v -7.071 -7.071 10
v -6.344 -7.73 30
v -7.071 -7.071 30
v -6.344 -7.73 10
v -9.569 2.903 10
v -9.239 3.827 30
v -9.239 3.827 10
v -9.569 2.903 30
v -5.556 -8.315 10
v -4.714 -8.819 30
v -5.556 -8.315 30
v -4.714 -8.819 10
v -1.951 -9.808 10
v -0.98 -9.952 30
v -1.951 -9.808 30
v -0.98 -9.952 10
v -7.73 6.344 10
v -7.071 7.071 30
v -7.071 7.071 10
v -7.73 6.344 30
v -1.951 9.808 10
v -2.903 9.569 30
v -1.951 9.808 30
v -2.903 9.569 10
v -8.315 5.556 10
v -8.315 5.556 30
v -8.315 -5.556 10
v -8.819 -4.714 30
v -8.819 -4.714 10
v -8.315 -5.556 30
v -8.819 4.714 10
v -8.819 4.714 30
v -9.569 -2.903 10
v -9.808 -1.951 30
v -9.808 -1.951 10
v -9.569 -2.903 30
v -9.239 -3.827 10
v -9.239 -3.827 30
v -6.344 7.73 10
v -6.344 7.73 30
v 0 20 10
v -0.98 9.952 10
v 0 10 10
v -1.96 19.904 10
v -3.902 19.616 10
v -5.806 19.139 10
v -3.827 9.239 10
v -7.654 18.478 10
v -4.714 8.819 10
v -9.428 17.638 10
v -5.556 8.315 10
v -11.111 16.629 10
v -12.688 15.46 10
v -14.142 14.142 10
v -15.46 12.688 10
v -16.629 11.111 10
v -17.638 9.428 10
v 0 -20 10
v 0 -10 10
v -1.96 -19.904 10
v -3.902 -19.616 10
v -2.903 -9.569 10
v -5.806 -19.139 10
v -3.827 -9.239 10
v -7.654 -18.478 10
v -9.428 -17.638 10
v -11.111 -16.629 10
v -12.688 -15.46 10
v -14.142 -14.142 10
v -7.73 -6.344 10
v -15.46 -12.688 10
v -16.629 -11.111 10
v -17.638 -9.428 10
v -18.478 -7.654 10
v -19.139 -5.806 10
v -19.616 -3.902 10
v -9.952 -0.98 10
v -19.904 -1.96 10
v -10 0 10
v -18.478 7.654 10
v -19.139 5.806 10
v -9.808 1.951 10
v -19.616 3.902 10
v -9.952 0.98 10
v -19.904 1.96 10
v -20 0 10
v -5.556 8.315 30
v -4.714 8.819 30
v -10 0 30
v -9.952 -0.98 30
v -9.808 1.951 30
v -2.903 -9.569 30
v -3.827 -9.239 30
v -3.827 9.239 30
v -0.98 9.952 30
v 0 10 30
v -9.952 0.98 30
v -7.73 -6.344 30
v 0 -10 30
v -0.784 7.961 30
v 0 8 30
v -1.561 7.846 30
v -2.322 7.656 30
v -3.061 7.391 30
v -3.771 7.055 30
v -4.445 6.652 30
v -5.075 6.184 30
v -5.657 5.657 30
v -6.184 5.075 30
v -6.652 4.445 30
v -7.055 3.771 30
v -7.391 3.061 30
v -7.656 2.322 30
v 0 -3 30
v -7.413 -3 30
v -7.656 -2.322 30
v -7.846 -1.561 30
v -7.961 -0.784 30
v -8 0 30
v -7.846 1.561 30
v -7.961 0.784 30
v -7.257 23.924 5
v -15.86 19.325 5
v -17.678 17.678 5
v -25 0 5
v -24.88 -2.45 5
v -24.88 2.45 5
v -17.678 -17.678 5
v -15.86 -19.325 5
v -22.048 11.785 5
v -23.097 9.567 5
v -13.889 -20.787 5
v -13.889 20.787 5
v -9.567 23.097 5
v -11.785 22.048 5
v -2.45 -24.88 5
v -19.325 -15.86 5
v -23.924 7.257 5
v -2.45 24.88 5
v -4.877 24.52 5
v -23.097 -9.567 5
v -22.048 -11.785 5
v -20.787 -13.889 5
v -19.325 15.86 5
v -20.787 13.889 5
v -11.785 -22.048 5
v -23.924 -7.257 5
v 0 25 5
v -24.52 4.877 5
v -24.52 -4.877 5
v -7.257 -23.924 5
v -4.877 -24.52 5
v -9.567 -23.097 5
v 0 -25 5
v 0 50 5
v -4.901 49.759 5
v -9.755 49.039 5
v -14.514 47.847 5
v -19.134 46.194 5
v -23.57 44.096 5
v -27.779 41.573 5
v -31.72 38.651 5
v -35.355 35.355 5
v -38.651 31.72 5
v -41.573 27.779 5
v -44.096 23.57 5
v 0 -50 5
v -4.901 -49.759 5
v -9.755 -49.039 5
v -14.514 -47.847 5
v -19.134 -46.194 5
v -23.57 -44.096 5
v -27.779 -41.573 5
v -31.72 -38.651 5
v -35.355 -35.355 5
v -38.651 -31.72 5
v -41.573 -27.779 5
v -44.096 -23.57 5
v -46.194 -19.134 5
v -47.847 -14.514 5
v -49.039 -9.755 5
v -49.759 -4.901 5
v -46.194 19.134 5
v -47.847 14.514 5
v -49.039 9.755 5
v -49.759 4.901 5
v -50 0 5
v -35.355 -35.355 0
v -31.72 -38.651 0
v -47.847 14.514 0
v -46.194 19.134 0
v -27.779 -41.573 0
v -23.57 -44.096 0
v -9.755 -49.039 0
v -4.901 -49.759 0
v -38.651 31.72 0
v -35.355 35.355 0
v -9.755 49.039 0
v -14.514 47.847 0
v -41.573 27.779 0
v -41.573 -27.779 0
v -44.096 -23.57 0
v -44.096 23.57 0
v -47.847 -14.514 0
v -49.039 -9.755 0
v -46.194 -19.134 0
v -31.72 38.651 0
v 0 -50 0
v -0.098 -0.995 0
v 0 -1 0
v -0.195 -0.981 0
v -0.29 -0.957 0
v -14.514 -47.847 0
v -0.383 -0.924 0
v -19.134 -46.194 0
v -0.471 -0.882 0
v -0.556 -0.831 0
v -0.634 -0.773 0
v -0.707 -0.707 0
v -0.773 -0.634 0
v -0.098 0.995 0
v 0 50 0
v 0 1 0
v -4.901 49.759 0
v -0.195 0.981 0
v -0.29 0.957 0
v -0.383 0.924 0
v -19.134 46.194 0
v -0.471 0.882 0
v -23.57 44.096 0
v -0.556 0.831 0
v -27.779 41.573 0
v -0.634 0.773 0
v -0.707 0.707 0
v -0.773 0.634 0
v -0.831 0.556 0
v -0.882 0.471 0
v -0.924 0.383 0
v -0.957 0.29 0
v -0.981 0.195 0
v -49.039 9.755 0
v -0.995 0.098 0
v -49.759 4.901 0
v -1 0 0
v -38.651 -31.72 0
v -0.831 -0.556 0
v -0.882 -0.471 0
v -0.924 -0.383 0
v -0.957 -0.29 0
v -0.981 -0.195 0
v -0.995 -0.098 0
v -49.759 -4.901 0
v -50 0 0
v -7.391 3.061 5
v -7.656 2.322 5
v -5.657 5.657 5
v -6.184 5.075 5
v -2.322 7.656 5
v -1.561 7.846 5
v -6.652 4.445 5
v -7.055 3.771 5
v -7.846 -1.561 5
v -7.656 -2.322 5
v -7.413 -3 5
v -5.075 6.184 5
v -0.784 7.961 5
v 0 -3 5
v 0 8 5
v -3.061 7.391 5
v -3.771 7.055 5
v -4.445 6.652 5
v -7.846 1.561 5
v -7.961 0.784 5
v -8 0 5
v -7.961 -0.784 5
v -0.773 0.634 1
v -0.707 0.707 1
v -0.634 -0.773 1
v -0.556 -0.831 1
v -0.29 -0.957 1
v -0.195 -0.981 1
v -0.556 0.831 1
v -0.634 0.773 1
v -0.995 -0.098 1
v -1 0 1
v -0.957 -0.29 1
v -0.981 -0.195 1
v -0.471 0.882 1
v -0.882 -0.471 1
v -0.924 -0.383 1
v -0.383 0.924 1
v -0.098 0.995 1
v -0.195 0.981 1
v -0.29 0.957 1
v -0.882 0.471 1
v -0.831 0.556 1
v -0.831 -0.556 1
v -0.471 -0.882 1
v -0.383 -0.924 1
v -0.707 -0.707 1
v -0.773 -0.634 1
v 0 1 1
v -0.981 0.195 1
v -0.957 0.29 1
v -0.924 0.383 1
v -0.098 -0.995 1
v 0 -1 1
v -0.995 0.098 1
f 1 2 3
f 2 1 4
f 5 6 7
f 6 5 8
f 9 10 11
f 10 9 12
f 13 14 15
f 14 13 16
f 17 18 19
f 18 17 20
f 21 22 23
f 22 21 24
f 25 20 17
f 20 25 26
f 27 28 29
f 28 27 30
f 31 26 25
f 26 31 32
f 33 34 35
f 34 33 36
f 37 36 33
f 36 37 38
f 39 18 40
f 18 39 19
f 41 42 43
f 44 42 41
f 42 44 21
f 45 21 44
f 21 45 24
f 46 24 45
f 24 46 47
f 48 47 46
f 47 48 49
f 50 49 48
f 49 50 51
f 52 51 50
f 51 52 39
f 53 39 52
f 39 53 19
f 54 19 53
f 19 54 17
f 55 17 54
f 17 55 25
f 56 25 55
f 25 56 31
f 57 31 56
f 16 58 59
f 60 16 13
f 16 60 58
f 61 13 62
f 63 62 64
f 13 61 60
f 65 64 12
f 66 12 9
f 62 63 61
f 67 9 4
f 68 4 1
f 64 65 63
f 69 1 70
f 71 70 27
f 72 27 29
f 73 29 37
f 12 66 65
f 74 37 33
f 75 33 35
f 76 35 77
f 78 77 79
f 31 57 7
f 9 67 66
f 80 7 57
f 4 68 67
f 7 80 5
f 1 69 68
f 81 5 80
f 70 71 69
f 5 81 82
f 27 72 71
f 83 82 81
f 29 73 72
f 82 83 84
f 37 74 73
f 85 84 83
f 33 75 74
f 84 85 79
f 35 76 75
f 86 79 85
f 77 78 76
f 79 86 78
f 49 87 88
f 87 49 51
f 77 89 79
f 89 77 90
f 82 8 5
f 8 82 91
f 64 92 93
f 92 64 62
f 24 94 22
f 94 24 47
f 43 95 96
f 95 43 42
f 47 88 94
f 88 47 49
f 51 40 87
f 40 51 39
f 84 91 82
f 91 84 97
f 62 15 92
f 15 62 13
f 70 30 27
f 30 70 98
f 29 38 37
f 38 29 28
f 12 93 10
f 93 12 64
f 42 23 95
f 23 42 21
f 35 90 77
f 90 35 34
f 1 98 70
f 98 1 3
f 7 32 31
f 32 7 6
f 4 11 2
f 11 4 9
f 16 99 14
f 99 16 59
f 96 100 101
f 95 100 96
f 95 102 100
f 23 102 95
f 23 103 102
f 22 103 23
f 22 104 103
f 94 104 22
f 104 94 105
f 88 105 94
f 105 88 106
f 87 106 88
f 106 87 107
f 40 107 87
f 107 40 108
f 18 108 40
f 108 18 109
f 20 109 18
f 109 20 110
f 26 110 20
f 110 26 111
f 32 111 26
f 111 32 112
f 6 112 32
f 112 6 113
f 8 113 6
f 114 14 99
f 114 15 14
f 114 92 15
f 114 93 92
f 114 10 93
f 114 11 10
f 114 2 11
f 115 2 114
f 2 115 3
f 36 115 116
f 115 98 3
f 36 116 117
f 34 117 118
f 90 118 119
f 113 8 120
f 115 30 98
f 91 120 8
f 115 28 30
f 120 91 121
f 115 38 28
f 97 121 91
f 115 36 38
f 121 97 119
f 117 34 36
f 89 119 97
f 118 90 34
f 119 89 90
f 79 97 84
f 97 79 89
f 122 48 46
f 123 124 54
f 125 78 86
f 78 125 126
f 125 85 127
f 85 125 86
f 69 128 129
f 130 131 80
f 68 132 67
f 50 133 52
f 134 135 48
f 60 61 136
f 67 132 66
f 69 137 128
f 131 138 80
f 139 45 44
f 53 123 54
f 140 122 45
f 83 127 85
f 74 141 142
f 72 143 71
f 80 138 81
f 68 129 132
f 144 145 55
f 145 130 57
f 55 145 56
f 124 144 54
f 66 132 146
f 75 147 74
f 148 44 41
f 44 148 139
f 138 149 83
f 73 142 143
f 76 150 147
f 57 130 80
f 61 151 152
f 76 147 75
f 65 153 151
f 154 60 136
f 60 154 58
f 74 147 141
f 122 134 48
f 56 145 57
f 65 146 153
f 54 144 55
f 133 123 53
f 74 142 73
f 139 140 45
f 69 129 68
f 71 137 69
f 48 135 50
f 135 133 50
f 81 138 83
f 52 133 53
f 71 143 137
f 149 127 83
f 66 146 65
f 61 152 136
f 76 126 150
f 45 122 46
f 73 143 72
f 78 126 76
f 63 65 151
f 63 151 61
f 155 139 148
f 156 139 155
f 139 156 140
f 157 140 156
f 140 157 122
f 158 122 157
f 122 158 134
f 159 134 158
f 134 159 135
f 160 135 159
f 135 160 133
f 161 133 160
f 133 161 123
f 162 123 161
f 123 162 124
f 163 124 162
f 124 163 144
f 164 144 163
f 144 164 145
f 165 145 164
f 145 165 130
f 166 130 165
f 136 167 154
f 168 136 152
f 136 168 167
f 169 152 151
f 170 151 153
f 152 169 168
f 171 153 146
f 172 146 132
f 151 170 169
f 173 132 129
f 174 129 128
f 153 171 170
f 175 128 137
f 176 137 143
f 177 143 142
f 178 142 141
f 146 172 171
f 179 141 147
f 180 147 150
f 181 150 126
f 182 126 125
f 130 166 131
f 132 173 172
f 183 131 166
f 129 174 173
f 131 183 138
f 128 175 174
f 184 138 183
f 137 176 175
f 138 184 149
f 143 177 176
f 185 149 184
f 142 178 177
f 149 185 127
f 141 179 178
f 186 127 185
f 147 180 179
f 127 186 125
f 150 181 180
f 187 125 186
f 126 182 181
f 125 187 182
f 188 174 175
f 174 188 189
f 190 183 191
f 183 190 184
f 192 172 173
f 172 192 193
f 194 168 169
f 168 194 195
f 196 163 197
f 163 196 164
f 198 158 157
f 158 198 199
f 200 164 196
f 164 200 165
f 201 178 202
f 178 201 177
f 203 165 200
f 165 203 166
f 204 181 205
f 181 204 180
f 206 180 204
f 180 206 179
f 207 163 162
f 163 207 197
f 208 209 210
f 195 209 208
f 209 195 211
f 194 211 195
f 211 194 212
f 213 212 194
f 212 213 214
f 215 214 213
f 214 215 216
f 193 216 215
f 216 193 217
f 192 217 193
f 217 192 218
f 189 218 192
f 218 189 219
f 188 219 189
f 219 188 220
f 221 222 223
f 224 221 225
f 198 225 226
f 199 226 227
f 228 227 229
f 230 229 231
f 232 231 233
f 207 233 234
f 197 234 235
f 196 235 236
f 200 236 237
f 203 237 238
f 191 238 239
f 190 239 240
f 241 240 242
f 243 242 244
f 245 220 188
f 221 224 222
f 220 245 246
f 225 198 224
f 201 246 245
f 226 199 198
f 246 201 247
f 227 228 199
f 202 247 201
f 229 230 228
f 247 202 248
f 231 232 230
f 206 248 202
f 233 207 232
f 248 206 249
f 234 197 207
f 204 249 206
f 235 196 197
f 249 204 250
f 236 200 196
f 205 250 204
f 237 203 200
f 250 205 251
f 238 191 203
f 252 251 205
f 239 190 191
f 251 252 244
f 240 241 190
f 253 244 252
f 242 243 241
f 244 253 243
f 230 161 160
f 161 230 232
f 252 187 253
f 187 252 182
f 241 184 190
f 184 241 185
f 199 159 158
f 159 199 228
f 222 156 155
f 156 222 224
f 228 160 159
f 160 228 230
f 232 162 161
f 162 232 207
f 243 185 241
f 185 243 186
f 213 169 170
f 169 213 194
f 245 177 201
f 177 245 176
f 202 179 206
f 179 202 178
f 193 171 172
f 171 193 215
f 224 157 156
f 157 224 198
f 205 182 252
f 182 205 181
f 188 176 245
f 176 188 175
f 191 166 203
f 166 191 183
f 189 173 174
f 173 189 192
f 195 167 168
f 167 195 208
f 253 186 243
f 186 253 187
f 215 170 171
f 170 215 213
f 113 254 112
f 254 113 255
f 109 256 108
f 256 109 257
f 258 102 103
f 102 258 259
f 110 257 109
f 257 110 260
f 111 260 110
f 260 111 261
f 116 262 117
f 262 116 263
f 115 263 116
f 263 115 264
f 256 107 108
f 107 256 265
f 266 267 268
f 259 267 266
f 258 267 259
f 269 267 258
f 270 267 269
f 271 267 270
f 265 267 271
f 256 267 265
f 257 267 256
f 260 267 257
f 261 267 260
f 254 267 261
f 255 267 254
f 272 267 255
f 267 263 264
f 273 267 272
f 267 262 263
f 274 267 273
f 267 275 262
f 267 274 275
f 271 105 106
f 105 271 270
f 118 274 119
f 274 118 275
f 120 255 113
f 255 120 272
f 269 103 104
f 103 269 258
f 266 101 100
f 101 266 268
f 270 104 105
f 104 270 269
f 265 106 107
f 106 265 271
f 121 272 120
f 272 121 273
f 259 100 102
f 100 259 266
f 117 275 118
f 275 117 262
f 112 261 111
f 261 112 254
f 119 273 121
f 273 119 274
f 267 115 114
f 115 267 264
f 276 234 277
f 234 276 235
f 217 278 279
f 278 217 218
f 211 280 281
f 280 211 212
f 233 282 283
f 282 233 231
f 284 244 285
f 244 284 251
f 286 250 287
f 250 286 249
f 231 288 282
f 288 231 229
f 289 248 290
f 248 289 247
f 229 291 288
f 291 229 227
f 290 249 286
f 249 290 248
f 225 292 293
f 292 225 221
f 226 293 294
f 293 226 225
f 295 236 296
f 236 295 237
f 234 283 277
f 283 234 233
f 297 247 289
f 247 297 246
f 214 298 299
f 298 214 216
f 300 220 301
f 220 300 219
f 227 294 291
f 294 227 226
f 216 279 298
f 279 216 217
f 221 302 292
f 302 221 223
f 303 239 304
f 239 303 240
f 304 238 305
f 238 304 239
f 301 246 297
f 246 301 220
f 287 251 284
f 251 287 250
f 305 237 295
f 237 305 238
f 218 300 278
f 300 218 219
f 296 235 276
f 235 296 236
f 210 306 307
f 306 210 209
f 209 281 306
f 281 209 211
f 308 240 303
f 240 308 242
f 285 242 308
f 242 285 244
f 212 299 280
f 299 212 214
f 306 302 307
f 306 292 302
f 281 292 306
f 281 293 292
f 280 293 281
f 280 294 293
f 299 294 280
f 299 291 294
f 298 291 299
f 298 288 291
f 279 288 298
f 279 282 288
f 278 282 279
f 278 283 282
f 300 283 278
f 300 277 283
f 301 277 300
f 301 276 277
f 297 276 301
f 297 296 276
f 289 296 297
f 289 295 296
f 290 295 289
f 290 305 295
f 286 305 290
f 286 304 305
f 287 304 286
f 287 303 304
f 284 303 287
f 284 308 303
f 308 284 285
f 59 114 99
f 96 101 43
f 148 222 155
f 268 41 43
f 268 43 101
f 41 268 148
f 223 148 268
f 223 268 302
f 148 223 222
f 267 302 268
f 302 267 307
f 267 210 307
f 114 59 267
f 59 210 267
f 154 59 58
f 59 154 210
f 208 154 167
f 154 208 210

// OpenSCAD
// Holder Base Component

// Input Variables in millimetres
$fn = 64; // number of vertices a cylinder
cutInHalfView = true; // toggle true to see half view

baseRadius = 50;
baseHeight = 5;

midBevelTopRadius = 20;
midBevelBottomRadius = 25;
midBevelHeight = 5;

topTubeRadius = 10;
topTubeHeight = 20;

holeRadius = 8;
holeDepth = 25;
holeEdgeFromRadius = 5; // Counting from the edge towards the centre

centreMarkerRadius = 1;
centreMarkerHeight = 1;

module baseModel() {
    union() {
        // Top
        translate([0,0,baseHeight+midBevelHeight])
            cylinder(r=topTubeRadius, h=topTubeHeight);
        // Middle
        translate([0,0,baseHeight])
            cylinder(r2=midBevelTopRadius, r1=midBevelBottomRadius, h=midBevelHeight);
        // Base 
        cylinder(r=baseRadius, h=baseHeight);
    }
}

module holeShape() {
    difference() {
        cylinder(r=holeRadius, h=holeDepth);
        translate([-holeRadius, -holeRadius, 0])
            cube([holeRadius*2, holeEdgeFromRadius, holeDepth]);
     }
}

totalHeight = baseHeight+midBevelHeight+topTubeHeight;
difference() {
    baseModel();
    translate([0,0,totalHeight-holeDepth])
        holeShape();
    cylinder(r=centreMarkerRadius, h=centreMarkerHeight);
    if(cutInHalfView) {
        translate([0,-baseRadius,0])
            cube([baseRadius,baseRadius*2,totalHeight]);
    }
}
